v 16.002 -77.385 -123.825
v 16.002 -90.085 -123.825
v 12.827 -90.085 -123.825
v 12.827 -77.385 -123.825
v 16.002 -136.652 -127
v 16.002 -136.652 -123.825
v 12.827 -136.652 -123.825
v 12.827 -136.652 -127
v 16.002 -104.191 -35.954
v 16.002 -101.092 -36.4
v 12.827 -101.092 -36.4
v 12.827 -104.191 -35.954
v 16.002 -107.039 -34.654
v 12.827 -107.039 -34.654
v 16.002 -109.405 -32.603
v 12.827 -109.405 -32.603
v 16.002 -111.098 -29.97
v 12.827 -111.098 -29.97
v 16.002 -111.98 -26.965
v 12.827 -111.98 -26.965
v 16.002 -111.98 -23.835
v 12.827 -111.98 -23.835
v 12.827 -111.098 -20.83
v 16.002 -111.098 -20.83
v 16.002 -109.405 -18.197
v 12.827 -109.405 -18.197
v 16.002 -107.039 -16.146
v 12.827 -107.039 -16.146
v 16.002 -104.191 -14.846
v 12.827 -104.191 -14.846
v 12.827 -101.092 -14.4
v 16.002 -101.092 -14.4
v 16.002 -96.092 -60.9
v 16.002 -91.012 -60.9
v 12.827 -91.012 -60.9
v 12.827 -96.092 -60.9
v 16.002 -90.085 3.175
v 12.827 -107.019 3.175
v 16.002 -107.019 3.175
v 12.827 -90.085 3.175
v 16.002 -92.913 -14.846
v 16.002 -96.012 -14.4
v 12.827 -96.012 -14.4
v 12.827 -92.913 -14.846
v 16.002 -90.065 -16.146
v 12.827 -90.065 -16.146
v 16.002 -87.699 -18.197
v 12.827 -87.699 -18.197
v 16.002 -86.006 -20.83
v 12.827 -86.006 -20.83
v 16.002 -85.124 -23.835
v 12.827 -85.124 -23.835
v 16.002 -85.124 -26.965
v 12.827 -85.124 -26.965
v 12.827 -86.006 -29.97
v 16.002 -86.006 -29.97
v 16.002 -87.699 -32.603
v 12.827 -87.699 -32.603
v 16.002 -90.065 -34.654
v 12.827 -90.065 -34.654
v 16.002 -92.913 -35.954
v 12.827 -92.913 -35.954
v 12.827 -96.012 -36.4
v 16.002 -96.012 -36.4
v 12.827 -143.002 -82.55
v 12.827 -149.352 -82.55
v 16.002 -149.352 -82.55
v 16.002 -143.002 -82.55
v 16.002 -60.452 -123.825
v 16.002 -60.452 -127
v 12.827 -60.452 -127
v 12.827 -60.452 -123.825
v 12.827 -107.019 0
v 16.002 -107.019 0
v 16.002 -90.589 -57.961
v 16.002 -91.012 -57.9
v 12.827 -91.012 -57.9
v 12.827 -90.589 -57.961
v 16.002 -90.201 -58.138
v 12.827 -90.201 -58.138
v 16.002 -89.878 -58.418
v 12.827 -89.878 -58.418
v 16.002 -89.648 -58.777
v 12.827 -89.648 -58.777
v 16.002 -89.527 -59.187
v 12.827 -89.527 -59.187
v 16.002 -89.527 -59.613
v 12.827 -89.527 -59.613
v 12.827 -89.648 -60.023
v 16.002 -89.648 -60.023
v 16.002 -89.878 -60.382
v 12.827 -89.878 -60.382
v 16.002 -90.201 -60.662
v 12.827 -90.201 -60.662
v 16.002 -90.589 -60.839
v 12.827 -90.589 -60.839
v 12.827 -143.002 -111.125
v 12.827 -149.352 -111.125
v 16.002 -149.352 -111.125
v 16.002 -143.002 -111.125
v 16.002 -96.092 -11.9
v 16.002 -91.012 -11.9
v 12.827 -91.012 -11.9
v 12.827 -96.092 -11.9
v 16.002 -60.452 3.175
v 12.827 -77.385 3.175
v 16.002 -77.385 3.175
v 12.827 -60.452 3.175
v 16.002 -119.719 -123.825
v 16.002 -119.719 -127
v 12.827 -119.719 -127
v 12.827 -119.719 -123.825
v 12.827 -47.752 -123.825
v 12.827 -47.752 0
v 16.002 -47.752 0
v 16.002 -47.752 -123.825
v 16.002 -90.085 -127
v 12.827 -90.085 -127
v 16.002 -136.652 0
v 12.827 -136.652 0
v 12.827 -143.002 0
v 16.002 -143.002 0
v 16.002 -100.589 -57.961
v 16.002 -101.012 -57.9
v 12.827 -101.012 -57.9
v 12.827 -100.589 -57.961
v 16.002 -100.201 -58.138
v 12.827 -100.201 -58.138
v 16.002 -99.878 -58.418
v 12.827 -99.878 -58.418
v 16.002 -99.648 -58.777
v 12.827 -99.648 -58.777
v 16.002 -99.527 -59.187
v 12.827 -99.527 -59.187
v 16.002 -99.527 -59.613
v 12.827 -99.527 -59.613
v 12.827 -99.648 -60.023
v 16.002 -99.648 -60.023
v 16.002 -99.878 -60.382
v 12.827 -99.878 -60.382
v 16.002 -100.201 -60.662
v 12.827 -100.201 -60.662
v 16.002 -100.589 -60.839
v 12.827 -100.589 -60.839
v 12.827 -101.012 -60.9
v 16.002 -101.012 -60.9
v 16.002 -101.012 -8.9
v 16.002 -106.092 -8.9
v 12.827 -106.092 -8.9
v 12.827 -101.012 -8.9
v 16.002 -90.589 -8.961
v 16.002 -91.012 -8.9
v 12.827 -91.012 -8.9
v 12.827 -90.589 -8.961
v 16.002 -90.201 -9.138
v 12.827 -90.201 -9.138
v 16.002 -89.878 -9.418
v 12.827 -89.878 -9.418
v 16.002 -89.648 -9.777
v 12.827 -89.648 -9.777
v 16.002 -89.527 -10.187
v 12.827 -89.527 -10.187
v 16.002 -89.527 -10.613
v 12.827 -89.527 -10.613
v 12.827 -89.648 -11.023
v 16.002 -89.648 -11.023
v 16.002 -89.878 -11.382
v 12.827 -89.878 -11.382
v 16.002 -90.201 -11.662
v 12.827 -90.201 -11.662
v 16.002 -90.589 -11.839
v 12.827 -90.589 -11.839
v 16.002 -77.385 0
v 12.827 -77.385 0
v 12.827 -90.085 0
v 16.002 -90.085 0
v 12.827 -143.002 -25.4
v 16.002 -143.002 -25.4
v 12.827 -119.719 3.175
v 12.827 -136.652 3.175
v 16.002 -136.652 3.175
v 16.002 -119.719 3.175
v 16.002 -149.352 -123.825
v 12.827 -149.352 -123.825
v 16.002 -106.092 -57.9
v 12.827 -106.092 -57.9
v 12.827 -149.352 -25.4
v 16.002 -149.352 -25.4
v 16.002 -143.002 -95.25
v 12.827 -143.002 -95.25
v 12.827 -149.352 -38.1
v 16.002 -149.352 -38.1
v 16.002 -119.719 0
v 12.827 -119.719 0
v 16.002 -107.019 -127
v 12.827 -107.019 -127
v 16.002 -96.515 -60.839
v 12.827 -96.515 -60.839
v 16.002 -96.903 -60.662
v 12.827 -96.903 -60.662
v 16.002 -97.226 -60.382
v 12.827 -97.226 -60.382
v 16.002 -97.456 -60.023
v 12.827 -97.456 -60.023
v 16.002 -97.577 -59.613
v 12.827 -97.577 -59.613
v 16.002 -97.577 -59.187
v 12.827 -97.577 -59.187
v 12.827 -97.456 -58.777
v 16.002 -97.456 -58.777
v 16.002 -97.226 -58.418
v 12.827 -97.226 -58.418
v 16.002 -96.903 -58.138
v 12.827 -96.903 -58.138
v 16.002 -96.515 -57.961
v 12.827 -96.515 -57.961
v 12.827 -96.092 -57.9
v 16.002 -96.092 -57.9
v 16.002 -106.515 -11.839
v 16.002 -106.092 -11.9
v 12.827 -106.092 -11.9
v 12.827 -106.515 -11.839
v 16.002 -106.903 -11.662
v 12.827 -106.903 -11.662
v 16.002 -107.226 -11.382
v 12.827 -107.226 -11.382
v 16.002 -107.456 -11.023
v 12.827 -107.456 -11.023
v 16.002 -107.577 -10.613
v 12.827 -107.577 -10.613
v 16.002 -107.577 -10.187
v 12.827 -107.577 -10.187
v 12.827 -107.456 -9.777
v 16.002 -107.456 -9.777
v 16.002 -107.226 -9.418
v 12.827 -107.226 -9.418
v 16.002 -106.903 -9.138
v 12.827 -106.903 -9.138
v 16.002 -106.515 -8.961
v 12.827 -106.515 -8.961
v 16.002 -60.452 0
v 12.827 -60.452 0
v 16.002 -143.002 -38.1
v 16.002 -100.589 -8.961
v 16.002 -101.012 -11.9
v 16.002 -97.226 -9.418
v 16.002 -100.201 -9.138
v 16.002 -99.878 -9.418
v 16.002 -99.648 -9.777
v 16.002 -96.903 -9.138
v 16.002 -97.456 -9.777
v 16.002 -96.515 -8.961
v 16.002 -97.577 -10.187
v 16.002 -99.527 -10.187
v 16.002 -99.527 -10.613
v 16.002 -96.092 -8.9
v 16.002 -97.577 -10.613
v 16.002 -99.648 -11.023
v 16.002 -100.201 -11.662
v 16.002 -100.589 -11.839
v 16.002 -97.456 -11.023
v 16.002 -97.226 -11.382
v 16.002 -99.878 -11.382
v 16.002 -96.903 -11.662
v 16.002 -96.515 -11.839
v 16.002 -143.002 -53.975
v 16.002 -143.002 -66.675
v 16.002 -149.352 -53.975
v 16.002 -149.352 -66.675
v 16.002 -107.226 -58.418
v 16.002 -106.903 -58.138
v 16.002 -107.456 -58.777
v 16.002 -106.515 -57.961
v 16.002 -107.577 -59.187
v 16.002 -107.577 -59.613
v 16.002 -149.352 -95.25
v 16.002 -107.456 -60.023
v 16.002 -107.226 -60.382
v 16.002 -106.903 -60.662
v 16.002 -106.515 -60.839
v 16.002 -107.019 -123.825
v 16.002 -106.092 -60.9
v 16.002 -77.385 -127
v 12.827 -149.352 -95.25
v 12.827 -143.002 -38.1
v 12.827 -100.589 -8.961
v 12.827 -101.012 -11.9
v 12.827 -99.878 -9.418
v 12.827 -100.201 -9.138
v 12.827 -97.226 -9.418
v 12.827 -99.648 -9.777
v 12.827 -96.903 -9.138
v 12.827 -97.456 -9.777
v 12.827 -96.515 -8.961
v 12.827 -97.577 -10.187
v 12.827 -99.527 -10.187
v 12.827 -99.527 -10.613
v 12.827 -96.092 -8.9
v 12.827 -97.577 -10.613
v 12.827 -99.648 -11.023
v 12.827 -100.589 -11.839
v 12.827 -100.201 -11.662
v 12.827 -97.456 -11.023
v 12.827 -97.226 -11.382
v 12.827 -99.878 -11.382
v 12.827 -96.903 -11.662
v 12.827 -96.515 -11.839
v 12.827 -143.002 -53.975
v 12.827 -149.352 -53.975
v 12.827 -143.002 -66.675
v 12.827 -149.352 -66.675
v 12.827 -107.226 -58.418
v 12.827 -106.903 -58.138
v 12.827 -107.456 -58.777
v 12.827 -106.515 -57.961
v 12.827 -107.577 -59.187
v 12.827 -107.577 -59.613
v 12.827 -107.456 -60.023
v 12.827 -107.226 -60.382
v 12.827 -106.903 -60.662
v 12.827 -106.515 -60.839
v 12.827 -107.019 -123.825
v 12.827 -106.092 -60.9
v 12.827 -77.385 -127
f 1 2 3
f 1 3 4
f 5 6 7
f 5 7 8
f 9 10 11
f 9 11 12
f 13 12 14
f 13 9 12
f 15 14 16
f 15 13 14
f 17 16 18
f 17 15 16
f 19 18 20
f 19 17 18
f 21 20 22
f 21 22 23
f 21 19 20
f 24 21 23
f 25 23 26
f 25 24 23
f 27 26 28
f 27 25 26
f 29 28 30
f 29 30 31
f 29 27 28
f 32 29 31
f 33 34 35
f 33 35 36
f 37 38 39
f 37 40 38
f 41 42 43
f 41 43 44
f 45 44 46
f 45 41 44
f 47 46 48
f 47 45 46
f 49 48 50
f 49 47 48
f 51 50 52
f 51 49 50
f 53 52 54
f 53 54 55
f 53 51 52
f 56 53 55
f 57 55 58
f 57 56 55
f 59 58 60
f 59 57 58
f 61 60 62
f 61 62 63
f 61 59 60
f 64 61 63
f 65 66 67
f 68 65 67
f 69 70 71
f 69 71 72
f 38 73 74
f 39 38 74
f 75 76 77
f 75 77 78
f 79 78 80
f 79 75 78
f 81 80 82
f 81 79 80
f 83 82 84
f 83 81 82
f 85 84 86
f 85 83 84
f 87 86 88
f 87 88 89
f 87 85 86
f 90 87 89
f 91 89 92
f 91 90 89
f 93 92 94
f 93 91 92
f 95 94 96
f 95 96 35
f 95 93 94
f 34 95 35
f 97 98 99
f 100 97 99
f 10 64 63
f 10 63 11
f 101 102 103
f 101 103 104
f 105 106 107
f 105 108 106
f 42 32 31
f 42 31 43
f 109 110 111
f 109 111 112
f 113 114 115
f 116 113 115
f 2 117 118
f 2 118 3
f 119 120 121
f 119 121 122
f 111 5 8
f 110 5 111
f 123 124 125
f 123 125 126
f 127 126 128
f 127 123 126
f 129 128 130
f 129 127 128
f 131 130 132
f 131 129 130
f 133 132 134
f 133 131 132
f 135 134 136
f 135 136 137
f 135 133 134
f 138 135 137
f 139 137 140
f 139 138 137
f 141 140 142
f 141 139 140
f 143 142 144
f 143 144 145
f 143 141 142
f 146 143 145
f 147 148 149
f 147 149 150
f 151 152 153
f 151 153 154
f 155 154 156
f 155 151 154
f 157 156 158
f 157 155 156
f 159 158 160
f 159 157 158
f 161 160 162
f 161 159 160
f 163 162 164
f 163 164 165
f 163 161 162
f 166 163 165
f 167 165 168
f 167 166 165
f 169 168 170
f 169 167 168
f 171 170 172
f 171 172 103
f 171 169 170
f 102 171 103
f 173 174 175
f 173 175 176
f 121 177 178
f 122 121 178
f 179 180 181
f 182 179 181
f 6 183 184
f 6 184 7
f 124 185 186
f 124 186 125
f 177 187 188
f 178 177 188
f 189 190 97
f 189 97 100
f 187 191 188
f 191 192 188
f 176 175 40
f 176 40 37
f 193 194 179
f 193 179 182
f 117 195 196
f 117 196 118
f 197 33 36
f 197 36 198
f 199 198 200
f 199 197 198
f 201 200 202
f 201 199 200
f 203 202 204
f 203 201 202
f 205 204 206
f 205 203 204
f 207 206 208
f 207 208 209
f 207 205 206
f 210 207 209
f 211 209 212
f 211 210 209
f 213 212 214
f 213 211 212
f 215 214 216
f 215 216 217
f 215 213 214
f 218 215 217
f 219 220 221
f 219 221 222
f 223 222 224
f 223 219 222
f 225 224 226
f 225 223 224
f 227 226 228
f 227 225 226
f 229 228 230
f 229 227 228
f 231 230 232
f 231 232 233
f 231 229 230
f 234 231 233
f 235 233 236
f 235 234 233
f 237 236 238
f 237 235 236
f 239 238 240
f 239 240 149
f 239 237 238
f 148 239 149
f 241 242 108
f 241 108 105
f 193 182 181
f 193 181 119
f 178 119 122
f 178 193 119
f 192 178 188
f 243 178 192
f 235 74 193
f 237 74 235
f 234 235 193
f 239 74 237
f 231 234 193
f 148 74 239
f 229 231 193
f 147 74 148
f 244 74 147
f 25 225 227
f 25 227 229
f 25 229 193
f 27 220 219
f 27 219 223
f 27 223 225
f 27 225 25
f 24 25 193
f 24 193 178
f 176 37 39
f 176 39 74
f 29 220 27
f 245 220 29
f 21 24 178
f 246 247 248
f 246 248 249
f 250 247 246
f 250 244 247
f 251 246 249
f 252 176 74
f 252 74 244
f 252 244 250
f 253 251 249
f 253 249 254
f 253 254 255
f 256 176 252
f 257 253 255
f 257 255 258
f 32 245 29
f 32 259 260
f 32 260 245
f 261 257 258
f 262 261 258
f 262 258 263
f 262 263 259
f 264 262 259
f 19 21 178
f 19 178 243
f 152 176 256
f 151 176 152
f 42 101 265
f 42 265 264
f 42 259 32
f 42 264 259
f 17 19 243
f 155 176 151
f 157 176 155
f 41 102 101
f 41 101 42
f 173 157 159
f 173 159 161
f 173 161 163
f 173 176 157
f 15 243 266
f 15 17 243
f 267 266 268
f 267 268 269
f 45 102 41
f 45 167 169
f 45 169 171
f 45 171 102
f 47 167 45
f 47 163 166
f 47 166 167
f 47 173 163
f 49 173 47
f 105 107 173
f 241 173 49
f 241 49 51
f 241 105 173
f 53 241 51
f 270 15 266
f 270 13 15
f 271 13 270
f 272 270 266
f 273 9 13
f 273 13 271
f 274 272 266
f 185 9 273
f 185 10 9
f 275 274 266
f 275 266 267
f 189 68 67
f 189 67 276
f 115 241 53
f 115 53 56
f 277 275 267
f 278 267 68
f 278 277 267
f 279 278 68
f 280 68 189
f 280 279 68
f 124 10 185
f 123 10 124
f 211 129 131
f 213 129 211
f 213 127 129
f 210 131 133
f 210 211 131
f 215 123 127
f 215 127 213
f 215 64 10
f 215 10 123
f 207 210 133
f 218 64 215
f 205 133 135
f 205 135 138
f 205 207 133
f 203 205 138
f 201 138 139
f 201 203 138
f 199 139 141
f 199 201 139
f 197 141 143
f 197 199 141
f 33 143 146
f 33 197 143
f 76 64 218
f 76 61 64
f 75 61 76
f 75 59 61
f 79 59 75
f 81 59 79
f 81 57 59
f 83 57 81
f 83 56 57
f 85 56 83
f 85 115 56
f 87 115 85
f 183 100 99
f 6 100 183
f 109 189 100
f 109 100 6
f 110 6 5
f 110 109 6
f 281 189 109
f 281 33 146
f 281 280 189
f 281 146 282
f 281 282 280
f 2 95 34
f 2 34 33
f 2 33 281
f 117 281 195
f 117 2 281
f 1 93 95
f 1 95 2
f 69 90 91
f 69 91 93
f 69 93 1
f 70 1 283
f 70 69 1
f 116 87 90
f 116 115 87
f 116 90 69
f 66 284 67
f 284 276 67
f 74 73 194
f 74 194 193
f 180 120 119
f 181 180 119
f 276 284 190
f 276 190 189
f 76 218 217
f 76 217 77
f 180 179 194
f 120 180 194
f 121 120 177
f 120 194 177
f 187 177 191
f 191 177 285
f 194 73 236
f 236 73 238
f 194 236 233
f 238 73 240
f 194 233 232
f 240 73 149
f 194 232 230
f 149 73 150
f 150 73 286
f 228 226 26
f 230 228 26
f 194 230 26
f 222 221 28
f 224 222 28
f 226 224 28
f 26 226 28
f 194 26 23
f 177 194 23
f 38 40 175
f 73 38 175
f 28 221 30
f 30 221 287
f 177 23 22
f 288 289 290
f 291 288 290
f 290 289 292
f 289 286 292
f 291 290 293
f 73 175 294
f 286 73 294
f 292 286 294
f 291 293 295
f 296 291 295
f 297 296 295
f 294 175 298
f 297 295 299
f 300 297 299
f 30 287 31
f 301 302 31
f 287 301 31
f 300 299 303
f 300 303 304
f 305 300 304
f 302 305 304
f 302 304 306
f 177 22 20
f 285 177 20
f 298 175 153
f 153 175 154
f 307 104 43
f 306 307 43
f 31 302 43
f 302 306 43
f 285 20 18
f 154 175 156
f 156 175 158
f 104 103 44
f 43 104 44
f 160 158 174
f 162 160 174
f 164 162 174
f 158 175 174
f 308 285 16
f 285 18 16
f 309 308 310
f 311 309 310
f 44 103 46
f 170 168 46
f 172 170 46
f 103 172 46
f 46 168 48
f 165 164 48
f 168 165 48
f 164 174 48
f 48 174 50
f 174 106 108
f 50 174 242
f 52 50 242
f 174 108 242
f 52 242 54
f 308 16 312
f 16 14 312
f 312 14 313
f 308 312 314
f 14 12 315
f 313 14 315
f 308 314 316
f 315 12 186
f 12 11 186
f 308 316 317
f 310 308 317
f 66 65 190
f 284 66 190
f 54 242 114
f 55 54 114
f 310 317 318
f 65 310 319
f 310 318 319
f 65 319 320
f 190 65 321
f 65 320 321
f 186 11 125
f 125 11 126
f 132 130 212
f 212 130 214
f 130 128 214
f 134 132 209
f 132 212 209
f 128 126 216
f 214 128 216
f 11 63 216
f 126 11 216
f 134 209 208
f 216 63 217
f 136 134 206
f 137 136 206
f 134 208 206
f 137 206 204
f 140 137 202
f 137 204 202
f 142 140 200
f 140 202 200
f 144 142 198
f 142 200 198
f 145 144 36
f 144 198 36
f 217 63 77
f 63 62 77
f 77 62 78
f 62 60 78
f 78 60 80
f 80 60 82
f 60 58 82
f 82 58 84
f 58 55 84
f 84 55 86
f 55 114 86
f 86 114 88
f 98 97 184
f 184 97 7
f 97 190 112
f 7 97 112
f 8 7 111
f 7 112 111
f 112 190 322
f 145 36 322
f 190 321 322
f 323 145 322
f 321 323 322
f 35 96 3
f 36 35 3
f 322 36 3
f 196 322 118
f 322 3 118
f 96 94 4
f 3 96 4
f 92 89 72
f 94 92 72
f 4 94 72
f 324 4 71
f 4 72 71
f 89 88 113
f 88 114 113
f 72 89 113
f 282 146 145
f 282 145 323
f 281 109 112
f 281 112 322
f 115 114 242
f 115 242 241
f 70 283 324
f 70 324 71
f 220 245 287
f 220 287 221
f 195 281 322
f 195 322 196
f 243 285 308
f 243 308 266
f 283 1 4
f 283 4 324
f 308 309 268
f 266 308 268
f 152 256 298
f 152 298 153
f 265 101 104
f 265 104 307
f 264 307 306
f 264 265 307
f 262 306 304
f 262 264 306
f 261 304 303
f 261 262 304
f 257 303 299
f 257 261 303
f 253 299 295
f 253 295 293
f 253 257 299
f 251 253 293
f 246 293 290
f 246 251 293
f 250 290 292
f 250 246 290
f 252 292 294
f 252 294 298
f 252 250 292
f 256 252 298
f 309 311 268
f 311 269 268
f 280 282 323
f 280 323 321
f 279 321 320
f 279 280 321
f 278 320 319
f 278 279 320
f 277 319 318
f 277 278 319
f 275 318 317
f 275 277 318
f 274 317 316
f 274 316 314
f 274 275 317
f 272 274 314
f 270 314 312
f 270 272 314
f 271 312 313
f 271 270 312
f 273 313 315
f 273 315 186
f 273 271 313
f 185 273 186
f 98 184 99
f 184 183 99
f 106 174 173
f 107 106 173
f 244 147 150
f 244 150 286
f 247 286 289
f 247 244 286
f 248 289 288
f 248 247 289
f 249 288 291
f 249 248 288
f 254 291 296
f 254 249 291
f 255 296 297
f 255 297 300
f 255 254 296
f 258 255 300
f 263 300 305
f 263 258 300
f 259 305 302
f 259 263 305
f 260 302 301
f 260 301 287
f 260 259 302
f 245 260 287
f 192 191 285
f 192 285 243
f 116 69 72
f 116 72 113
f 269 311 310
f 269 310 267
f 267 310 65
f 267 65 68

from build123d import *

# Parameters (mm, degrees)
SKETCH1_W               = 44.958
SKETCH1_H               = 304.8
BOSS_EXTRUDE1_DEPTH     = 3.175
BOSS_EXTRUDE2_DEPTH     = 3.175
SKETCH3_W               = 123.825
SKETCH3_H               = 6.35
BOSS_EXTRUDE3_DEPTH     = 41.783
SKETCH8_W               = 3.175
SKETCH8_H               = 213.451350416
CUT_EXTRUDE4_DEPTH      = 1
CUT_EXTRUDE4_DEPTH_BACK = 131.175
SKETCH6_W               = 3.175
SKETCH6_H               = 12.7
CUT_EXTRUDE5_DEPTH      = 3.175
SKETCH4_3_W             = 6.35
SKETCH4_3_H             = 15.875
SKETCH4_3_H_2           = 5.588
SKETCH4_3_H_3           = 7.112
CUT_EXTRUDE6_DEPTH      = 6.35


with BuildPart() as part:
    # Sketch1 → Boss-Extrude1 (new body)
    with BuildSketch(Plane.XY):
        with Locations((-6.477, 3.048)):
            Rectangle(SKETCH1_W, SKETCH1_H)
        with BuildLine():
            Line((-3.302, 133.858), (-3.302, -143.002))
            Line((-3.302, -143.002), (3.302, -143.002))
            Line((3.302, -143.002), (3.302, 143.002))
            Line((3.302, 143.002), (-16.256, 143.002))
            Line((-16.256, 143.002), (-16.256, 136.398))
            Line((-16.256, 136.398), (-5.842, 136.398))
            ThreePointArc((-5.842, 136.398), (-4.045948776, 135.654051224), (-3.302, 133.858))
        make_face(mode=Mode.SUBTRACT)
    extrude(amount=BOSS_EXTRUDE1_DEPTH)

    # Sketch2 → Boss-Extrude2 (add)
    with BuildSketch(Plane(origin=(16.002, 0, 0), x_dir=(0, 0, -1), z_dir=(1, 0, 0))):
        Polygon((123.825, -47.752), (-3.175, -47.752), (-3.175, -149.352), (123.825, -149.352), (123.825, -136.652), (127, -136.652), (127, -119.718666667), (123.825, -119.718666667), (123.825, -107.018666667), (127, -107.018666667), (127, -90.085333333), (123.825, -90.085333333), (123.825, -77.385333333), (127, -77.385333333), (127, -60.452), (123.825, -60.452), align=None)
        with BuildLine():
            ThreePointArc((11.9, -106.092), (10.4, -107.592), (8.9, -106.092))
            Line((8.9, -106.092), (8.9, -101.012))
            ThreePointArc((8.9, -101.012), (10.4, -99.512), (11.9, -101.012))
            Line((11.9, -101.012), (11.9, -106.092))
        make_face(mode=Mode.SUBTRACT)
        with BuildLine():
            ThreePointArc((60.9, -106.092), (59.4, -107.592), (57.9, -106.092))
            Line((57.9, -106.092), (57.9, -101.012))
            ThreePointArc((57.9, -101.012), (59.4, -99.512), (60.9, -101.012))
            Line((60.9, -101.012), (60.9, -106.092))
        make_face(mode=Mode.SUBTRACT)
        with BuildLine():
            Line((8.9, -96.092), (8.9, -91.012))
            ThreePointArc((8.9, -91.012), (10.4, -89.512), (11.9, -91.012))
            Line((11.9, -91.012), (11.9, -96.092))
            ThreePointArc((11.9, -96.092), (10.4, -97.592), (8.9, -96.092))
        make_face(mode=Mode.SUBTRACT)
        with BuildLine():
            ThreePointArc((36.4, -101.092), (25.4, -112.092), (14.4, -101.092))
            Line((14.4, -101.092), (14.4, -96.012))
            ThreePointArc((14.4, -96.012), (25.4, -85.012), (36.4, -96.012))
            Line((36.4, -96.012), (36.4, -101.092))
        make_face(mode=Mode.SUBTRACT)
        with BuildLine():
            ThreePointArc((57.9, -91.012), (59.4, -89.512), (60.9, -91.012))
            Line((60.9, -91.012), (60.9, -96.092))
            ThreePointArc((60.9, -96.092), (59.4, -97.592), (57.9, -96.092))
            Line((57.9, -96.092), (57.9, -91.012))
        make_face(mode=Mode.SUBTRACT)
    extrude(amount=-BOSS_EXTRUDE2_DEPTH)

    # Sketch3 → Boss-Extrude3 (add)
    with BuildSketch(Plane.ZY.offset(-12.827)):
        with Locations((-61.9125, -146.177)):
            Rectangle(SKETCH3_W, SKETCH3_H)
    extrude(amount=BOSS_EXTRUDE3_DEPTH)

    # Sketch8 → Cut-Extrude4 (cut, two sides)
    with BuildSketch(Plane.XY.offset(3.175)) as cut_extrude4_sk:
        Polygon((-28.956, -149.352), (12.827, -149.352), (12.827, -47.752), (12.827, 155.448), (-28.956, 155.448), align=None)
        with BuildLine():
            Line((-16.256, 136.398), (-16.256, 143.002))
            Line((-16.256, 143.002), (3.302, 143.002))
            Line((3.302, 143.002), (3.302, -143.002))
            Line((3.302, -143.002), (-3.302, -143.002))
            Line((-3.302, -143.002), (-3.302, 133.858))
            ThreePointArc((-3.302, 133.858), (-4.045948776, 135.654051224), (-5.842, 136.398))
            Line((-5.842, 136.398), (-16.256, 136.398))
        make_face(mode=Mode.SUBTRACT)
        Polygon((-54.223542679, -149.352), (-28.956, -149.352), (-28.956, 155.448), (12.827, 155.448), (12.827, 165.699350416), (-54.223542679, 165.699350416), align=None)
        with Locations((14.4145, 58.973675208)):
            Rectangle(SKETCH8_W, SKETCH8_H)
    extrude(amount=CUT_EXTRUDE4_DEPTH, mode=Mode.SUBTRACT)
    extrude(cut_extrude4_sk.sketch, amount=-CUT_EXTRUDE4_DEPTH_BACK, mode=Mode.SUBTRACT)

    # Sketch6 → Cut-Extrude5 (cut)
    with BuildSketch(Plane.XY.offset(3.175)):
        with Locations((14.4145, -54.102)):
            Rectangle(SKETCH6_W, SKETCH6_H)
        with Locations((14.4145, -83.735333333)):
            Rectangle(SKETCH6_W, SKETCH6_H)
        with Locations((14.4145, -113.368666667)):
            Rectangle(SKETCH6_W, SKETCH6_H)
        with Locations((14.4145, -143.002)):
            Rectangle(SKETCH6_W, SKETCH6_H)
    extrude(amount=-CUT_EXTRUDE5_DEPTH, mode=Mode.SUBTRACT)

    # Sketch4<3> → Cut-Extrude6 (cut)
    with BuildSketch(Plane.XZ.offset(149.352)):
        with Locations((12.827, -103.1875)):
            Rectangle(SKETCH4_3_W, SKETCH4_3_H)
        with Locations((12.827, -74.6125)):
            Rectangle(SKETCH4_3_W, SKETCH4_3_H)
        with Locations((12.827, -46.0375)):
            Rectangle(SKETCH4_3_W, SKETCH4_3_H)
        with Locations((12.827, -17.4625)):
            Rectangle(SKETCH4_3_W, SKETCH4_3_H)
        with Locations((12.827, 0.381)):
            Rectangle(SKETCH4_3_W, SKETCH4_3_H_2)
        with Locations((12.827, -5.969)):
            Rectangle(SKETCH4_3_W, SKETCH4_3_H_3)
    extrude(amount=-CUT_EXTRUDE6_DEPTH, mode=Mode.SUBTRACT)


solid = part.part
